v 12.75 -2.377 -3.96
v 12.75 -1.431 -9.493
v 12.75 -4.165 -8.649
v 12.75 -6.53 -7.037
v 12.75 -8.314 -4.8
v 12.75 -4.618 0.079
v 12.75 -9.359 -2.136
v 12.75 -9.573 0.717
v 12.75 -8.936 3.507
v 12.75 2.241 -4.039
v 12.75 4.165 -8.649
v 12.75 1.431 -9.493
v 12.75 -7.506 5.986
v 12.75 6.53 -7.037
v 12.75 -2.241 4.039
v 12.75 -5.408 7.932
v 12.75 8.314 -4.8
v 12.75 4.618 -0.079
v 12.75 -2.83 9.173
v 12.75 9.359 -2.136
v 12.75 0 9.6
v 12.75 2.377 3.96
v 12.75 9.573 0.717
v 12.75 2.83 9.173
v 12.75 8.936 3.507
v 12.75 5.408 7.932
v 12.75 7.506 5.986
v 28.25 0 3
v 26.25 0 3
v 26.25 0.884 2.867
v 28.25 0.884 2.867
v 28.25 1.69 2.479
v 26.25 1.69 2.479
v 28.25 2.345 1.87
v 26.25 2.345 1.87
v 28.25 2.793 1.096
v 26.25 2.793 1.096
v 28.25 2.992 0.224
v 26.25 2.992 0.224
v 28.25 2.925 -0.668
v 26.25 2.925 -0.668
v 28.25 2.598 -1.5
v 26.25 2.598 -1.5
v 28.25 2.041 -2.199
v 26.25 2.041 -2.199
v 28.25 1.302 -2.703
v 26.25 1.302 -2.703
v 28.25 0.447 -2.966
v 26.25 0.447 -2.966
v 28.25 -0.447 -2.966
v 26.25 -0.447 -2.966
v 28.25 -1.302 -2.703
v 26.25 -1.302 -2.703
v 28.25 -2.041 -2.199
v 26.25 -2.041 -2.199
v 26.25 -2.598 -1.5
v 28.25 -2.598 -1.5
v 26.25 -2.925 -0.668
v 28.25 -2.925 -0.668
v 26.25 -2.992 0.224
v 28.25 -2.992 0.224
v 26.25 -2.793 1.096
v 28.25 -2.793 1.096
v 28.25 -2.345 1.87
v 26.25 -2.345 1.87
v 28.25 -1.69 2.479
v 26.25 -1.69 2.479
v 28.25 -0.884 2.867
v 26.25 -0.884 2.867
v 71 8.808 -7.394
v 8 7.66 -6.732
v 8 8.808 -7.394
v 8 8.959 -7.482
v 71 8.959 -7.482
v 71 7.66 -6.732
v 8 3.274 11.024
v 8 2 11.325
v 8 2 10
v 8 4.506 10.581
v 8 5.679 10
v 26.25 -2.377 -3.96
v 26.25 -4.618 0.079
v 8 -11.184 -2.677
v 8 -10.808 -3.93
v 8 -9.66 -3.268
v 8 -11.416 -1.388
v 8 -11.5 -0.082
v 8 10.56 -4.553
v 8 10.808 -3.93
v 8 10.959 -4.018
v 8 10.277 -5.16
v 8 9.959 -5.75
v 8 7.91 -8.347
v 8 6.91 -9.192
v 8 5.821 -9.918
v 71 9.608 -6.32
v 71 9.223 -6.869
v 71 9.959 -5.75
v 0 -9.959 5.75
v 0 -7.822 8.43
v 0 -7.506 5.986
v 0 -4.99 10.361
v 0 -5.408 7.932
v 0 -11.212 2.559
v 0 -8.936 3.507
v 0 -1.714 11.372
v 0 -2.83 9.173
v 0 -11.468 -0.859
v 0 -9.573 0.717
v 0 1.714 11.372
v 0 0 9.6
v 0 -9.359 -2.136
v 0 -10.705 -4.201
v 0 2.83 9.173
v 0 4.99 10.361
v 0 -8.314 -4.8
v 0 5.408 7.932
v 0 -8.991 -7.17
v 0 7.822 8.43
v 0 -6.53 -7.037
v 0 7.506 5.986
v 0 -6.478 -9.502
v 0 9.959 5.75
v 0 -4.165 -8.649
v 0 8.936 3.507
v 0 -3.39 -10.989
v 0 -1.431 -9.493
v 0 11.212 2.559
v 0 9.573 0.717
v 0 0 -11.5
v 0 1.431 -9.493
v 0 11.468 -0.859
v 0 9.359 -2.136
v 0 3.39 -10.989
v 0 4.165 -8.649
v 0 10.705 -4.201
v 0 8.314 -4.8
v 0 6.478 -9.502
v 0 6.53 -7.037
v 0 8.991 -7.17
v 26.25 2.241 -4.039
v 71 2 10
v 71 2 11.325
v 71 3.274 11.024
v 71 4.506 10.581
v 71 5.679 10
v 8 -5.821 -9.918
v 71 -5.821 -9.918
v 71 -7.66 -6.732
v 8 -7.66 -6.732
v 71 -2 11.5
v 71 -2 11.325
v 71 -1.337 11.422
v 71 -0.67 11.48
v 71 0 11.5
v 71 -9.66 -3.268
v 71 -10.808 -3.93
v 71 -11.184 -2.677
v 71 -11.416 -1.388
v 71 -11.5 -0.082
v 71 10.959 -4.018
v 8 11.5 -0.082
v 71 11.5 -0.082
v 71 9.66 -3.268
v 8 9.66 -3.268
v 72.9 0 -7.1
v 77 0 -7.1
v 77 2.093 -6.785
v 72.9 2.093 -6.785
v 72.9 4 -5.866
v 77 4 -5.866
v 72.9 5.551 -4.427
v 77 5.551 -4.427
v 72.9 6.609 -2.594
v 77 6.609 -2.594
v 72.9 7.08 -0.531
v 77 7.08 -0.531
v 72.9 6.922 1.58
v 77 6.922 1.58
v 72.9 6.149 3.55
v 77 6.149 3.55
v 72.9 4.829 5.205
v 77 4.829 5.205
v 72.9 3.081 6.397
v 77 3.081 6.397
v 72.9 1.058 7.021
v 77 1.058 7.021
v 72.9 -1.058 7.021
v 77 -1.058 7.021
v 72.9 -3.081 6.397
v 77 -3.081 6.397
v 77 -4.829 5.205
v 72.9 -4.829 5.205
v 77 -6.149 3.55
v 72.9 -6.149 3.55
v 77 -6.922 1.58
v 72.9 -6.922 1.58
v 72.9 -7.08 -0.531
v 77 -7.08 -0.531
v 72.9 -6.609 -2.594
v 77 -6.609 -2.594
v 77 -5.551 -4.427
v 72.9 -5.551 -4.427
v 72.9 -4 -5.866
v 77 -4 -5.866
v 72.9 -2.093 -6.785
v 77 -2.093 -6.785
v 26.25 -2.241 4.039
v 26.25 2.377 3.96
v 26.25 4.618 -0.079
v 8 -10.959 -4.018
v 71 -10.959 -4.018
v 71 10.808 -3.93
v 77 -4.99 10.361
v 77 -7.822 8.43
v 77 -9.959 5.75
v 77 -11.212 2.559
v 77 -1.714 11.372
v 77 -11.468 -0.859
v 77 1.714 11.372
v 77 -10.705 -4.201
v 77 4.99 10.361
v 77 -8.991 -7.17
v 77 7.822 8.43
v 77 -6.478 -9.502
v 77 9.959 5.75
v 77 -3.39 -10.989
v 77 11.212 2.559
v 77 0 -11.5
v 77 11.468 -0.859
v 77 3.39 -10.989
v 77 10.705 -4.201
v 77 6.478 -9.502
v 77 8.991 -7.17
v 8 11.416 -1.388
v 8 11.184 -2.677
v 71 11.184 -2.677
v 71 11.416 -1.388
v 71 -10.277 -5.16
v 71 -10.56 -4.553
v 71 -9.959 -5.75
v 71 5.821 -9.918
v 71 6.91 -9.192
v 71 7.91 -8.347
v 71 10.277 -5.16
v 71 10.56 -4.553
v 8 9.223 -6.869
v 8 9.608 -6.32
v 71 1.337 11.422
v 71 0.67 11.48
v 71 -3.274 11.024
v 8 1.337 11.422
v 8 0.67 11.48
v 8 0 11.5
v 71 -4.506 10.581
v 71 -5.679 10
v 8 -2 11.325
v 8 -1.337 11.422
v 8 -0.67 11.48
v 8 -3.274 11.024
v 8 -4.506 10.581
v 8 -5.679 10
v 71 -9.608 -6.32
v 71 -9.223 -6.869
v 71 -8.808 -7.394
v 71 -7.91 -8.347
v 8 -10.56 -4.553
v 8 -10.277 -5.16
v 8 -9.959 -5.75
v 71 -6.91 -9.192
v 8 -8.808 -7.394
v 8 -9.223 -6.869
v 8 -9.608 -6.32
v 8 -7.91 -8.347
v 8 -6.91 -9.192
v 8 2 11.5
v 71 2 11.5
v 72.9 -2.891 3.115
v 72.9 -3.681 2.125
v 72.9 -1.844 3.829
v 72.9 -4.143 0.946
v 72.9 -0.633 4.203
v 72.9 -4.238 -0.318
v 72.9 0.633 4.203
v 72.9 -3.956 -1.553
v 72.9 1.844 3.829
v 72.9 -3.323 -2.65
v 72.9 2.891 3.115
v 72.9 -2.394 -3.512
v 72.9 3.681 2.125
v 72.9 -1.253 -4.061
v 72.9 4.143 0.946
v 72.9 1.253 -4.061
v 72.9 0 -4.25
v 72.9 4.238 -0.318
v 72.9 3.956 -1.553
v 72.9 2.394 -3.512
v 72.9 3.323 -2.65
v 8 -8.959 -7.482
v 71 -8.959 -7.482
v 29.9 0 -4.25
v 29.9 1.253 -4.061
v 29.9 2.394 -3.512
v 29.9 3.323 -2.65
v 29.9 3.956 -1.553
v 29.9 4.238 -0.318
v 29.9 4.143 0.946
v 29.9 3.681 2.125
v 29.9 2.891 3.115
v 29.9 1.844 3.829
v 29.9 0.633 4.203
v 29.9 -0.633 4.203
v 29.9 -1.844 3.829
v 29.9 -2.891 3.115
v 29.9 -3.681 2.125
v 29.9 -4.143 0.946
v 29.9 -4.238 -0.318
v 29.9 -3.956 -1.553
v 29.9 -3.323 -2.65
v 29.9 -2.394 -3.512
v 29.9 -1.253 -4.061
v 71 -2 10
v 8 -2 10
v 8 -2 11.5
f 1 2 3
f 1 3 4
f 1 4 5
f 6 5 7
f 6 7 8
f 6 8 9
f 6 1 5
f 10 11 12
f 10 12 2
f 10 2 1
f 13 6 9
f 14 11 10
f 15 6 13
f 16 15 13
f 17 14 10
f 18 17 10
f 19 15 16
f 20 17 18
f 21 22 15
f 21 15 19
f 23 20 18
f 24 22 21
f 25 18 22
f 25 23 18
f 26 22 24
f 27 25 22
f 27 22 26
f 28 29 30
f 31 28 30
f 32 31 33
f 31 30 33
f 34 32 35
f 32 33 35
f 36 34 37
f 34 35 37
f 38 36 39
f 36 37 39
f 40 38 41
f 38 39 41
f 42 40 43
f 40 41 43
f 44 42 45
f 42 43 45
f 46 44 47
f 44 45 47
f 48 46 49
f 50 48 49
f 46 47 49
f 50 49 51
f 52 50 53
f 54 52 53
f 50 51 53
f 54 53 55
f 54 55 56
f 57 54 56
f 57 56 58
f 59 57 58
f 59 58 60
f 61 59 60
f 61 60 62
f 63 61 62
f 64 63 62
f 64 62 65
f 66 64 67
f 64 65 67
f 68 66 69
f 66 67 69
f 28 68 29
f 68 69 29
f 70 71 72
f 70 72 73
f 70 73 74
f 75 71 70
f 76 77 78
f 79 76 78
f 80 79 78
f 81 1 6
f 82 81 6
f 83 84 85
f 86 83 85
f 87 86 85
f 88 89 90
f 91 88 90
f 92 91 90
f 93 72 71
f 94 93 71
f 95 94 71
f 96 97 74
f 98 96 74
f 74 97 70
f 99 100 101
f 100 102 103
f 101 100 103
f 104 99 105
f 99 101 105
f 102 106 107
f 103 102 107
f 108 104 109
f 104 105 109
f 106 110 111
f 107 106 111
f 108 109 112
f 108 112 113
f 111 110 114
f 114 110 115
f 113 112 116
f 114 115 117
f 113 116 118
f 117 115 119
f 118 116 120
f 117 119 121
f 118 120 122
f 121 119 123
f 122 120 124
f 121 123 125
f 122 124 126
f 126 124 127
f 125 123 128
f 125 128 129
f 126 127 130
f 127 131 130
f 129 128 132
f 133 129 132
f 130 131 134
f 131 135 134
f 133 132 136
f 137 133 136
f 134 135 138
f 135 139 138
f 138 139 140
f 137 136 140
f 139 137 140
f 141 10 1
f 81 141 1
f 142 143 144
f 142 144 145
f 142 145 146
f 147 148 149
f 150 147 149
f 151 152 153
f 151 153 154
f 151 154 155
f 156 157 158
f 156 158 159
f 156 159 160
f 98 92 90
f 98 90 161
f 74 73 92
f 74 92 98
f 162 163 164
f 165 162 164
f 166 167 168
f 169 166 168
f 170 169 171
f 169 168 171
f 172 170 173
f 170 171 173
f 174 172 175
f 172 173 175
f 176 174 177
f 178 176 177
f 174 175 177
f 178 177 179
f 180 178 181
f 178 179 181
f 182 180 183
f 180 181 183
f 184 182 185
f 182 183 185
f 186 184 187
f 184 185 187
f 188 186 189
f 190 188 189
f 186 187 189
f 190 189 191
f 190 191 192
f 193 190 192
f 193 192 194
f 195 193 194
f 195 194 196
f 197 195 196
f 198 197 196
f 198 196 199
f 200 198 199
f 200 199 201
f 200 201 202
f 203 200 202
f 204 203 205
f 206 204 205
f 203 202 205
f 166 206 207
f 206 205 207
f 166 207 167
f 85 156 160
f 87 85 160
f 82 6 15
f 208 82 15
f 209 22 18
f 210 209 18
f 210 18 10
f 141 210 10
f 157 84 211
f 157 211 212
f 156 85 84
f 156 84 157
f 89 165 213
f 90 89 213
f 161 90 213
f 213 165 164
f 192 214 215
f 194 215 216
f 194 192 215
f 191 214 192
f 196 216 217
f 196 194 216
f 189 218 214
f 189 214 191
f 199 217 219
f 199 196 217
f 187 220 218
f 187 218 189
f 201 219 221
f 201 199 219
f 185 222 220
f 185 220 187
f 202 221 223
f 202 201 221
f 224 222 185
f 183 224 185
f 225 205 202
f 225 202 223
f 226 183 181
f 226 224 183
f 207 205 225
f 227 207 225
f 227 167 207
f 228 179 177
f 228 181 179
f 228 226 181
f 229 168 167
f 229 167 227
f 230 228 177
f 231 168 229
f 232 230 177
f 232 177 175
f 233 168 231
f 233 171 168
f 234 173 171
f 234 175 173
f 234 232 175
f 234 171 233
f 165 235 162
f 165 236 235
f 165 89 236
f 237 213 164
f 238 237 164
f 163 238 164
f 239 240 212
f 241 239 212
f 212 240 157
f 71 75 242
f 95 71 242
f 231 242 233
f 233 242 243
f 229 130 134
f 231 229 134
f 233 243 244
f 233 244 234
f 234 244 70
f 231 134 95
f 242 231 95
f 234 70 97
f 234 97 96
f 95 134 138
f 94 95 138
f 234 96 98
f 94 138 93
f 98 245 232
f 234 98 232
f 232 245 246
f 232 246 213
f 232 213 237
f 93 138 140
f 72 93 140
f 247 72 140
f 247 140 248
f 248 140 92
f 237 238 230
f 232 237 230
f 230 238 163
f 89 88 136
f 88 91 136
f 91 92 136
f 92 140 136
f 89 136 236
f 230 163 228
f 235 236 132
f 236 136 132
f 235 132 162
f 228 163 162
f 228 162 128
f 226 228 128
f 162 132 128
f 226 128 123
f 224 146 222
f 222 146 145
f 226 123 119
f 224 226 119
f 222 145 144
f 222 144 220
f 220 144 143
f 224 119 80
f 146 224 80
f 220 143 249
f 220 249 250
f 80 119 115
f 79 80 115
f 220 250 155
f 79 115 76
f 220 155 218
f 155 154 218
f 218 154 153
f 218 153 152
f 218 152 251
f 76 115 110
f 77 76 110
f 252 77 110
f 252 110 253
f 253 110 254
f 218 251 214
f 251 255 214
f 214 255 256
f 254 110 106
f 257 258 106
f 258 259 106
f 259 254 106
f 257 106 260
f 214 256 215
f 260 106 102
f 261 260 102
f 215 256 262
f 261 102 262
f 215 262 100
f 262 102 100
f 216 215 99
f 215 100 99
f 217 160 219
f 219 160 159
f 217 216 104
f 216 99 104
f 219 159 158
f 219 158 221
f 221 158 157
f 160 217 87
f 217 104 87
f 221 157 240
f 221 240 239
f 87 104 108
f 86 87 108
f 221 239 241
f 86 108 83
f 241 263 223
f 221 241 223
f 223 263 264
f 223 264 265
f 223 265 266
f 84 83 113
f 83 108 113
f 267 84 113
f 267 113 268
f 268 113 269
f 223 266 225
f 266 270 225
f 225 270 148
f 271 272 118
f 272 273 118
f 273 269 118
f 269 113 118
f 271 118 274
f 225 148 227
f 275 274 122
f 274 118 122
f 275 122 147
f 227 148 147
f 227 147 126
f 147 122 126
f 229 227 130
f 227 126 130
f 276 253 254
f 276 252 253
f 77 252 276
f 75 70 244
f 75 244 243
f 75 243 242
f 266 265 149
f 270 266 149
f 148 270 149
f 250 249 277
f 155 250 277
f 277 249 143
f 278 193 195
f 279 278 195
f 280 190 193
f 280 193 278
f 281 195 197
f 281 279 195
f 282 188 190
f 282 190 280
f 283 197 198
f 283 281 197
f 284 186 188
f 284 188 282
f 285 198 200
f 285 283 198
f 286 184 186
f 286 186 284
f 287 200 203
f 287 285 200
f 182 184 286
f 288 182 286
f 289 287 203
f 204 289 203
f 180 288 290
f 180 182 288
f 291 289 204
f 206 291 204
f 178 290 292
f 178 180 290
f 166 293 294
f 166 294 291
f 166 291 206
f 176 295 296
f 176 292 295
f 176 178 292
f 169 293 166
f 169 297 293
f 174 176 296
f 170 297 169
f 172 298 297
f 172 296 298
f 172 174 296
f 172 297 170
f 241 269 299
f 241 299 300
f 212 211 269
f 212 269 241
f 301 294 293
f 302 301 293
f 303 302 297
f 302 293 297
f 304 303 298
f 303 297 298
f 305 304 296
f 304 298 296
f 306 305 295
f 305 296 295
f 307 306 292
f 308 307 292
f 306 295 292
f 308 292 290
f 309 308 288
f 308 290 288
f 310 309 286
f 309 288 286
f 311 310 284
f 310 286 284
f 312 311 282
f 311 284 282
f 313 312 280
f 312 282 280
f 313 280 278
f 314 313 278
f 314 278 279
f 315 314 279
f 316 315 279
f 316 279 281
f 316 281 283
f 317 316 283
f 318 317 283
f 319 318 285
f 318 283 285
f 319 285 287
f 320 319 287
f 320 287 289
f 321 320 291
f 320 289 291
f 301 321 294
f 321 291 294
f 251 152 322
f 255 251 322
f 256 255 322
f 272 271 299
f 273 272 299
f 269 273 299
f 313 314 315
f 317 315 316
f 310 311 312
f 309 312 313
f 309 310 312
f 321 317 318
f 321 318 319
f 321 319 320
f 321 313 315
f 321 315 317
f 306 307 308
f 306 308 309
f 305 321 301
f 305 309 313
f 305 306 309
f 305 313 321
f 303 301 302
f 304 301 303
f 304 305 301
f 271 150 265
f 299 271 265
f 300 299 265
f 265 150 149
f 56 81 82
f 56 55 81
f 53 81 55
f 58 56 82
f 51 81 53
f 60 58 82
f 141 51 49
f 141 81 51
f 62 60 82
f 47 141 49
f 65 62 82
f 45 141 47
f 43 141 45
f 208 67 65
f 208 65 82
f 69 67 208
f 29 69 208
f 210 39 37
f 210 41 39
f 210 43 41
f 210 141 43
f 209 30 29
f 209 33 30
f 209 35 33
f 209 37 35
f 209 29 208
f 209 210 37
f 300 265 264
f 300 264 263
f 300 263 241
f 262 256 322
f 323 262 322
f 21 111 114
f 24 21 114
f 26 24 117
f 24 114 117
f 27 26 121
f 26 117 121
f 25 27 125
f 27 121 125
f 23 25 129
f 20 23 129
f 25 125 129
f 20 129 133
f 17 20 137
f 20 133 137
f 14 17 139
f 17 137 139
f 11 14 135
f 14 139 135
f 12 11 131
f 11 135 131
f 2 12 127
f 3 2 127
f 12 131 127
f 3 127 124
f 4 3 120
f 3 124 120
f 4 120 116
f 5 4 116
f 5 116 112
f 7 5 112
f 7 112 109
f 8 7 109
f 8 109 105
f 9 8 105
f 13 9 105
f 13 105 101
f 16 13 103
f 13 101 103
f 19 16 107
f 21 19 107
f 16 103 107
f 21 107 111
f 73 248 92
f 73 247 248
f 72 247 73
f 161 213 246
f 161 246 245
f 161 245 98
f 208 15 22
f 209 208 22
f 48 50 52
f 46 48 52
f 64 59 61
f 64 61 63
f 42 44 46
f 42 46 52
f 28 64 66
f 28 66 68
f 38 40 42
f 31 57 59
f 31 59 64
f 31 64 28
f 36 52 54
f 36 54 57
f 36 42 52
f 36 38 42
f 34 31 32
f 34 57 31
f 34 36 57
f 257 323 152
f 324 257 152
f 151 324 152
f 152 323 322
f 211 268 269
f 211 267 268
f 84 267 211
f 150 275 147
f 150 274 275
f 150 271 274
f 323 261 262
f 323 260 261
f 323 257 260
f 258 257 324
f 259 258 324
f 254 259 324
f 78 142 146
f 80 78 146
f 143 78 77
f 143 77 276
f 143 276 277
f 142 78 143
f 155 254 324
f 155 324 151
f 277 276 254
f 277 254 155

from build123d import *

# Parameters (mm, degrees)
SKIZZE1_R                       = 11.5
AUFSATZ_LINEAR_AUSTRAGEN1_DEPTH = 77
SKIZZE2_R                       = 7.1
SCHNITT_LINEAR_AUSTRAGEN1_DEPTH = 4.1
SKIZZE3_R                       = 4.25
SCHNITT_LINEAR_AUSTRAGEN2_DEPTH = 43
SKIZZE4_R                       = 9.6
SCHNITT_LINEAR_AUSTRAGEN3_DEPTH = 12.75
SCHNITT_LINEAR_START            = -6
SKIZZE7_W                       = 1.5
SKIZZE7_H                       = 15
SCHNITT_LINEAR_AUSTRAGEN4_DEPTH = 63
SKIZZE8_W                       = 63
SKIZZE8_H                       = 4
AUFSATZ_LINEAR_AUSTRAGEN2_DEPTH = 1.5
SCHNITT_LINEAR_AUSTRAGEN6_DEPTH = 13.5
SKIZZE12_R                      = 3
SCHNITT_LINEAR_AUSTRAGEN7_DEPTH = 2
KREISMUSTER3_COUNT              = 3


with BuildPart() as part:
    # Skizze1 → Aufsatz-Linear austragen1 (new body)
    with BuildSketch(Plane(origin=(0, 0, 0), x_dir=(0, 0, -1), z_dir=(1, 0, 0))):
        Circle(SKIZZE1_R)
    extrude(amount=AUFSATZ_LINEAR_AUSTRAGEN1_DEPTH)

    # Skizze2 → Schnitt-Linear austragen1 (cut)
    with BuildSketch(Plane(origin=(77, 0, 0), x_dir=(0, 0, -1), z_dir=(1, 0, 0))):
        Circle(SKIZZE2_R)
    extrude(amount=-SCHNITT_LINEAR_AUSTRAGEN1_DEPTH, mode=Mode.SUBTRACT)

    # Skizze3 → Schnitt-Linear austragen2 (cut)
    with BuildSketch(Plane(origin=(72.9, 0, 0), x_dir=(0, 0, -1), z_dir=(1, 0, 0))):
        Circle(SKIZZE3_R)
    extrude(amount=-SCHNITT_LINEAR_AUSTRAGEN2_DEPTH, mode=Mode.SUBTRACT)

    # Skizze4 → Schnitt-Linear austragen3 (cut)
    with BuildSketch(Plane.ZY):
        Circle(SKIZZE4_R)
    extrude(amount=-SCHNITT_LINEAR_AUSTRAGEN3_DEPTH, mode=Mode.SUBTRACT)

    # Skizze7 → Schnitt-Linear austragen4 (cut)
    with BuildSketch(Plane(origin=(77, 0, 0), x_dir=(0, 0, -1), z_dir=(1, 0, 0)).offset(SCHNITT_LINEAR_START)):
        with Locations((-10.75, 0)):
            Rectangle(SKIZZE7_W, SKIZZE7_H)
    schnitt_linear_austragen4 = extrude(amount=-SCHNITT_LINEAR_AUSTRAGEN4_DEPTH, mode=Mode.SUBTRACT)

    # Skizze8 → Aufsatz-Linear austragen2 (add)
    with BuildSketch(Plane.XY.offset(10)):
        with Locations((39.5, 0)):
            Rectangle(SKIZZE8_W, SKIZZE8_H)
    aufsatz_linear_austragen2 = extrude(amount=AUFSATZ_LINEAR_AUSTRAGEN2_DEPTH)

    # Skizze10 → Schnitt-Linear austragen6 (cut)
    with BuildSketch(Plane.ZY.offset(-12.75)):
        Polygon((4.038863706, -2.240739453), (3.959969143, 2.377388845), (-0.078894563, 4.618128298), (-4.038863706, 2.240739453), (-3.959969143, -2.377388845), (0.078894563, -4.618128298), align=None)
    extrude(amount=-SCHNITT_LINEAR_AUSTRAGEN6_DEPTH, mode=Mode.SUBTRACT)

    # Skizze12 → Schnitt-Linear austragen7 (cut)
    with BuildSketch(Plane.ZY.offset(-26.25)):
        Circle(SKIZZE12_R)
    extrude(amount=-SCHNITT_LINEAR_AUSTRAGEN7_DEPTH, mode=Mode.SUBTRACT)

    # Kreismuster3: Schnitt-Linear austragen4, Aufsatz-Linear austragen2 ×3 about axis
    kreismuster3_axis = Axis((0, 0, 0), (1, 0, 0))
    add([schnitt_linear_austragen4.rotate(kreismuster3_axis, i * 360 / KREISMUSTER3_COUNT) for i in range(1, KREISMUSTER3_COUNT)], mode=Mode.SUBTRACT)
    add([aufsatz_linear_austragen2.rotate(kreismuster3_axis, i * 360 / KREISMUSTER3_COUNT) for i in range(1, KREISMUSTER3_COUNT)])


solid = part.part
